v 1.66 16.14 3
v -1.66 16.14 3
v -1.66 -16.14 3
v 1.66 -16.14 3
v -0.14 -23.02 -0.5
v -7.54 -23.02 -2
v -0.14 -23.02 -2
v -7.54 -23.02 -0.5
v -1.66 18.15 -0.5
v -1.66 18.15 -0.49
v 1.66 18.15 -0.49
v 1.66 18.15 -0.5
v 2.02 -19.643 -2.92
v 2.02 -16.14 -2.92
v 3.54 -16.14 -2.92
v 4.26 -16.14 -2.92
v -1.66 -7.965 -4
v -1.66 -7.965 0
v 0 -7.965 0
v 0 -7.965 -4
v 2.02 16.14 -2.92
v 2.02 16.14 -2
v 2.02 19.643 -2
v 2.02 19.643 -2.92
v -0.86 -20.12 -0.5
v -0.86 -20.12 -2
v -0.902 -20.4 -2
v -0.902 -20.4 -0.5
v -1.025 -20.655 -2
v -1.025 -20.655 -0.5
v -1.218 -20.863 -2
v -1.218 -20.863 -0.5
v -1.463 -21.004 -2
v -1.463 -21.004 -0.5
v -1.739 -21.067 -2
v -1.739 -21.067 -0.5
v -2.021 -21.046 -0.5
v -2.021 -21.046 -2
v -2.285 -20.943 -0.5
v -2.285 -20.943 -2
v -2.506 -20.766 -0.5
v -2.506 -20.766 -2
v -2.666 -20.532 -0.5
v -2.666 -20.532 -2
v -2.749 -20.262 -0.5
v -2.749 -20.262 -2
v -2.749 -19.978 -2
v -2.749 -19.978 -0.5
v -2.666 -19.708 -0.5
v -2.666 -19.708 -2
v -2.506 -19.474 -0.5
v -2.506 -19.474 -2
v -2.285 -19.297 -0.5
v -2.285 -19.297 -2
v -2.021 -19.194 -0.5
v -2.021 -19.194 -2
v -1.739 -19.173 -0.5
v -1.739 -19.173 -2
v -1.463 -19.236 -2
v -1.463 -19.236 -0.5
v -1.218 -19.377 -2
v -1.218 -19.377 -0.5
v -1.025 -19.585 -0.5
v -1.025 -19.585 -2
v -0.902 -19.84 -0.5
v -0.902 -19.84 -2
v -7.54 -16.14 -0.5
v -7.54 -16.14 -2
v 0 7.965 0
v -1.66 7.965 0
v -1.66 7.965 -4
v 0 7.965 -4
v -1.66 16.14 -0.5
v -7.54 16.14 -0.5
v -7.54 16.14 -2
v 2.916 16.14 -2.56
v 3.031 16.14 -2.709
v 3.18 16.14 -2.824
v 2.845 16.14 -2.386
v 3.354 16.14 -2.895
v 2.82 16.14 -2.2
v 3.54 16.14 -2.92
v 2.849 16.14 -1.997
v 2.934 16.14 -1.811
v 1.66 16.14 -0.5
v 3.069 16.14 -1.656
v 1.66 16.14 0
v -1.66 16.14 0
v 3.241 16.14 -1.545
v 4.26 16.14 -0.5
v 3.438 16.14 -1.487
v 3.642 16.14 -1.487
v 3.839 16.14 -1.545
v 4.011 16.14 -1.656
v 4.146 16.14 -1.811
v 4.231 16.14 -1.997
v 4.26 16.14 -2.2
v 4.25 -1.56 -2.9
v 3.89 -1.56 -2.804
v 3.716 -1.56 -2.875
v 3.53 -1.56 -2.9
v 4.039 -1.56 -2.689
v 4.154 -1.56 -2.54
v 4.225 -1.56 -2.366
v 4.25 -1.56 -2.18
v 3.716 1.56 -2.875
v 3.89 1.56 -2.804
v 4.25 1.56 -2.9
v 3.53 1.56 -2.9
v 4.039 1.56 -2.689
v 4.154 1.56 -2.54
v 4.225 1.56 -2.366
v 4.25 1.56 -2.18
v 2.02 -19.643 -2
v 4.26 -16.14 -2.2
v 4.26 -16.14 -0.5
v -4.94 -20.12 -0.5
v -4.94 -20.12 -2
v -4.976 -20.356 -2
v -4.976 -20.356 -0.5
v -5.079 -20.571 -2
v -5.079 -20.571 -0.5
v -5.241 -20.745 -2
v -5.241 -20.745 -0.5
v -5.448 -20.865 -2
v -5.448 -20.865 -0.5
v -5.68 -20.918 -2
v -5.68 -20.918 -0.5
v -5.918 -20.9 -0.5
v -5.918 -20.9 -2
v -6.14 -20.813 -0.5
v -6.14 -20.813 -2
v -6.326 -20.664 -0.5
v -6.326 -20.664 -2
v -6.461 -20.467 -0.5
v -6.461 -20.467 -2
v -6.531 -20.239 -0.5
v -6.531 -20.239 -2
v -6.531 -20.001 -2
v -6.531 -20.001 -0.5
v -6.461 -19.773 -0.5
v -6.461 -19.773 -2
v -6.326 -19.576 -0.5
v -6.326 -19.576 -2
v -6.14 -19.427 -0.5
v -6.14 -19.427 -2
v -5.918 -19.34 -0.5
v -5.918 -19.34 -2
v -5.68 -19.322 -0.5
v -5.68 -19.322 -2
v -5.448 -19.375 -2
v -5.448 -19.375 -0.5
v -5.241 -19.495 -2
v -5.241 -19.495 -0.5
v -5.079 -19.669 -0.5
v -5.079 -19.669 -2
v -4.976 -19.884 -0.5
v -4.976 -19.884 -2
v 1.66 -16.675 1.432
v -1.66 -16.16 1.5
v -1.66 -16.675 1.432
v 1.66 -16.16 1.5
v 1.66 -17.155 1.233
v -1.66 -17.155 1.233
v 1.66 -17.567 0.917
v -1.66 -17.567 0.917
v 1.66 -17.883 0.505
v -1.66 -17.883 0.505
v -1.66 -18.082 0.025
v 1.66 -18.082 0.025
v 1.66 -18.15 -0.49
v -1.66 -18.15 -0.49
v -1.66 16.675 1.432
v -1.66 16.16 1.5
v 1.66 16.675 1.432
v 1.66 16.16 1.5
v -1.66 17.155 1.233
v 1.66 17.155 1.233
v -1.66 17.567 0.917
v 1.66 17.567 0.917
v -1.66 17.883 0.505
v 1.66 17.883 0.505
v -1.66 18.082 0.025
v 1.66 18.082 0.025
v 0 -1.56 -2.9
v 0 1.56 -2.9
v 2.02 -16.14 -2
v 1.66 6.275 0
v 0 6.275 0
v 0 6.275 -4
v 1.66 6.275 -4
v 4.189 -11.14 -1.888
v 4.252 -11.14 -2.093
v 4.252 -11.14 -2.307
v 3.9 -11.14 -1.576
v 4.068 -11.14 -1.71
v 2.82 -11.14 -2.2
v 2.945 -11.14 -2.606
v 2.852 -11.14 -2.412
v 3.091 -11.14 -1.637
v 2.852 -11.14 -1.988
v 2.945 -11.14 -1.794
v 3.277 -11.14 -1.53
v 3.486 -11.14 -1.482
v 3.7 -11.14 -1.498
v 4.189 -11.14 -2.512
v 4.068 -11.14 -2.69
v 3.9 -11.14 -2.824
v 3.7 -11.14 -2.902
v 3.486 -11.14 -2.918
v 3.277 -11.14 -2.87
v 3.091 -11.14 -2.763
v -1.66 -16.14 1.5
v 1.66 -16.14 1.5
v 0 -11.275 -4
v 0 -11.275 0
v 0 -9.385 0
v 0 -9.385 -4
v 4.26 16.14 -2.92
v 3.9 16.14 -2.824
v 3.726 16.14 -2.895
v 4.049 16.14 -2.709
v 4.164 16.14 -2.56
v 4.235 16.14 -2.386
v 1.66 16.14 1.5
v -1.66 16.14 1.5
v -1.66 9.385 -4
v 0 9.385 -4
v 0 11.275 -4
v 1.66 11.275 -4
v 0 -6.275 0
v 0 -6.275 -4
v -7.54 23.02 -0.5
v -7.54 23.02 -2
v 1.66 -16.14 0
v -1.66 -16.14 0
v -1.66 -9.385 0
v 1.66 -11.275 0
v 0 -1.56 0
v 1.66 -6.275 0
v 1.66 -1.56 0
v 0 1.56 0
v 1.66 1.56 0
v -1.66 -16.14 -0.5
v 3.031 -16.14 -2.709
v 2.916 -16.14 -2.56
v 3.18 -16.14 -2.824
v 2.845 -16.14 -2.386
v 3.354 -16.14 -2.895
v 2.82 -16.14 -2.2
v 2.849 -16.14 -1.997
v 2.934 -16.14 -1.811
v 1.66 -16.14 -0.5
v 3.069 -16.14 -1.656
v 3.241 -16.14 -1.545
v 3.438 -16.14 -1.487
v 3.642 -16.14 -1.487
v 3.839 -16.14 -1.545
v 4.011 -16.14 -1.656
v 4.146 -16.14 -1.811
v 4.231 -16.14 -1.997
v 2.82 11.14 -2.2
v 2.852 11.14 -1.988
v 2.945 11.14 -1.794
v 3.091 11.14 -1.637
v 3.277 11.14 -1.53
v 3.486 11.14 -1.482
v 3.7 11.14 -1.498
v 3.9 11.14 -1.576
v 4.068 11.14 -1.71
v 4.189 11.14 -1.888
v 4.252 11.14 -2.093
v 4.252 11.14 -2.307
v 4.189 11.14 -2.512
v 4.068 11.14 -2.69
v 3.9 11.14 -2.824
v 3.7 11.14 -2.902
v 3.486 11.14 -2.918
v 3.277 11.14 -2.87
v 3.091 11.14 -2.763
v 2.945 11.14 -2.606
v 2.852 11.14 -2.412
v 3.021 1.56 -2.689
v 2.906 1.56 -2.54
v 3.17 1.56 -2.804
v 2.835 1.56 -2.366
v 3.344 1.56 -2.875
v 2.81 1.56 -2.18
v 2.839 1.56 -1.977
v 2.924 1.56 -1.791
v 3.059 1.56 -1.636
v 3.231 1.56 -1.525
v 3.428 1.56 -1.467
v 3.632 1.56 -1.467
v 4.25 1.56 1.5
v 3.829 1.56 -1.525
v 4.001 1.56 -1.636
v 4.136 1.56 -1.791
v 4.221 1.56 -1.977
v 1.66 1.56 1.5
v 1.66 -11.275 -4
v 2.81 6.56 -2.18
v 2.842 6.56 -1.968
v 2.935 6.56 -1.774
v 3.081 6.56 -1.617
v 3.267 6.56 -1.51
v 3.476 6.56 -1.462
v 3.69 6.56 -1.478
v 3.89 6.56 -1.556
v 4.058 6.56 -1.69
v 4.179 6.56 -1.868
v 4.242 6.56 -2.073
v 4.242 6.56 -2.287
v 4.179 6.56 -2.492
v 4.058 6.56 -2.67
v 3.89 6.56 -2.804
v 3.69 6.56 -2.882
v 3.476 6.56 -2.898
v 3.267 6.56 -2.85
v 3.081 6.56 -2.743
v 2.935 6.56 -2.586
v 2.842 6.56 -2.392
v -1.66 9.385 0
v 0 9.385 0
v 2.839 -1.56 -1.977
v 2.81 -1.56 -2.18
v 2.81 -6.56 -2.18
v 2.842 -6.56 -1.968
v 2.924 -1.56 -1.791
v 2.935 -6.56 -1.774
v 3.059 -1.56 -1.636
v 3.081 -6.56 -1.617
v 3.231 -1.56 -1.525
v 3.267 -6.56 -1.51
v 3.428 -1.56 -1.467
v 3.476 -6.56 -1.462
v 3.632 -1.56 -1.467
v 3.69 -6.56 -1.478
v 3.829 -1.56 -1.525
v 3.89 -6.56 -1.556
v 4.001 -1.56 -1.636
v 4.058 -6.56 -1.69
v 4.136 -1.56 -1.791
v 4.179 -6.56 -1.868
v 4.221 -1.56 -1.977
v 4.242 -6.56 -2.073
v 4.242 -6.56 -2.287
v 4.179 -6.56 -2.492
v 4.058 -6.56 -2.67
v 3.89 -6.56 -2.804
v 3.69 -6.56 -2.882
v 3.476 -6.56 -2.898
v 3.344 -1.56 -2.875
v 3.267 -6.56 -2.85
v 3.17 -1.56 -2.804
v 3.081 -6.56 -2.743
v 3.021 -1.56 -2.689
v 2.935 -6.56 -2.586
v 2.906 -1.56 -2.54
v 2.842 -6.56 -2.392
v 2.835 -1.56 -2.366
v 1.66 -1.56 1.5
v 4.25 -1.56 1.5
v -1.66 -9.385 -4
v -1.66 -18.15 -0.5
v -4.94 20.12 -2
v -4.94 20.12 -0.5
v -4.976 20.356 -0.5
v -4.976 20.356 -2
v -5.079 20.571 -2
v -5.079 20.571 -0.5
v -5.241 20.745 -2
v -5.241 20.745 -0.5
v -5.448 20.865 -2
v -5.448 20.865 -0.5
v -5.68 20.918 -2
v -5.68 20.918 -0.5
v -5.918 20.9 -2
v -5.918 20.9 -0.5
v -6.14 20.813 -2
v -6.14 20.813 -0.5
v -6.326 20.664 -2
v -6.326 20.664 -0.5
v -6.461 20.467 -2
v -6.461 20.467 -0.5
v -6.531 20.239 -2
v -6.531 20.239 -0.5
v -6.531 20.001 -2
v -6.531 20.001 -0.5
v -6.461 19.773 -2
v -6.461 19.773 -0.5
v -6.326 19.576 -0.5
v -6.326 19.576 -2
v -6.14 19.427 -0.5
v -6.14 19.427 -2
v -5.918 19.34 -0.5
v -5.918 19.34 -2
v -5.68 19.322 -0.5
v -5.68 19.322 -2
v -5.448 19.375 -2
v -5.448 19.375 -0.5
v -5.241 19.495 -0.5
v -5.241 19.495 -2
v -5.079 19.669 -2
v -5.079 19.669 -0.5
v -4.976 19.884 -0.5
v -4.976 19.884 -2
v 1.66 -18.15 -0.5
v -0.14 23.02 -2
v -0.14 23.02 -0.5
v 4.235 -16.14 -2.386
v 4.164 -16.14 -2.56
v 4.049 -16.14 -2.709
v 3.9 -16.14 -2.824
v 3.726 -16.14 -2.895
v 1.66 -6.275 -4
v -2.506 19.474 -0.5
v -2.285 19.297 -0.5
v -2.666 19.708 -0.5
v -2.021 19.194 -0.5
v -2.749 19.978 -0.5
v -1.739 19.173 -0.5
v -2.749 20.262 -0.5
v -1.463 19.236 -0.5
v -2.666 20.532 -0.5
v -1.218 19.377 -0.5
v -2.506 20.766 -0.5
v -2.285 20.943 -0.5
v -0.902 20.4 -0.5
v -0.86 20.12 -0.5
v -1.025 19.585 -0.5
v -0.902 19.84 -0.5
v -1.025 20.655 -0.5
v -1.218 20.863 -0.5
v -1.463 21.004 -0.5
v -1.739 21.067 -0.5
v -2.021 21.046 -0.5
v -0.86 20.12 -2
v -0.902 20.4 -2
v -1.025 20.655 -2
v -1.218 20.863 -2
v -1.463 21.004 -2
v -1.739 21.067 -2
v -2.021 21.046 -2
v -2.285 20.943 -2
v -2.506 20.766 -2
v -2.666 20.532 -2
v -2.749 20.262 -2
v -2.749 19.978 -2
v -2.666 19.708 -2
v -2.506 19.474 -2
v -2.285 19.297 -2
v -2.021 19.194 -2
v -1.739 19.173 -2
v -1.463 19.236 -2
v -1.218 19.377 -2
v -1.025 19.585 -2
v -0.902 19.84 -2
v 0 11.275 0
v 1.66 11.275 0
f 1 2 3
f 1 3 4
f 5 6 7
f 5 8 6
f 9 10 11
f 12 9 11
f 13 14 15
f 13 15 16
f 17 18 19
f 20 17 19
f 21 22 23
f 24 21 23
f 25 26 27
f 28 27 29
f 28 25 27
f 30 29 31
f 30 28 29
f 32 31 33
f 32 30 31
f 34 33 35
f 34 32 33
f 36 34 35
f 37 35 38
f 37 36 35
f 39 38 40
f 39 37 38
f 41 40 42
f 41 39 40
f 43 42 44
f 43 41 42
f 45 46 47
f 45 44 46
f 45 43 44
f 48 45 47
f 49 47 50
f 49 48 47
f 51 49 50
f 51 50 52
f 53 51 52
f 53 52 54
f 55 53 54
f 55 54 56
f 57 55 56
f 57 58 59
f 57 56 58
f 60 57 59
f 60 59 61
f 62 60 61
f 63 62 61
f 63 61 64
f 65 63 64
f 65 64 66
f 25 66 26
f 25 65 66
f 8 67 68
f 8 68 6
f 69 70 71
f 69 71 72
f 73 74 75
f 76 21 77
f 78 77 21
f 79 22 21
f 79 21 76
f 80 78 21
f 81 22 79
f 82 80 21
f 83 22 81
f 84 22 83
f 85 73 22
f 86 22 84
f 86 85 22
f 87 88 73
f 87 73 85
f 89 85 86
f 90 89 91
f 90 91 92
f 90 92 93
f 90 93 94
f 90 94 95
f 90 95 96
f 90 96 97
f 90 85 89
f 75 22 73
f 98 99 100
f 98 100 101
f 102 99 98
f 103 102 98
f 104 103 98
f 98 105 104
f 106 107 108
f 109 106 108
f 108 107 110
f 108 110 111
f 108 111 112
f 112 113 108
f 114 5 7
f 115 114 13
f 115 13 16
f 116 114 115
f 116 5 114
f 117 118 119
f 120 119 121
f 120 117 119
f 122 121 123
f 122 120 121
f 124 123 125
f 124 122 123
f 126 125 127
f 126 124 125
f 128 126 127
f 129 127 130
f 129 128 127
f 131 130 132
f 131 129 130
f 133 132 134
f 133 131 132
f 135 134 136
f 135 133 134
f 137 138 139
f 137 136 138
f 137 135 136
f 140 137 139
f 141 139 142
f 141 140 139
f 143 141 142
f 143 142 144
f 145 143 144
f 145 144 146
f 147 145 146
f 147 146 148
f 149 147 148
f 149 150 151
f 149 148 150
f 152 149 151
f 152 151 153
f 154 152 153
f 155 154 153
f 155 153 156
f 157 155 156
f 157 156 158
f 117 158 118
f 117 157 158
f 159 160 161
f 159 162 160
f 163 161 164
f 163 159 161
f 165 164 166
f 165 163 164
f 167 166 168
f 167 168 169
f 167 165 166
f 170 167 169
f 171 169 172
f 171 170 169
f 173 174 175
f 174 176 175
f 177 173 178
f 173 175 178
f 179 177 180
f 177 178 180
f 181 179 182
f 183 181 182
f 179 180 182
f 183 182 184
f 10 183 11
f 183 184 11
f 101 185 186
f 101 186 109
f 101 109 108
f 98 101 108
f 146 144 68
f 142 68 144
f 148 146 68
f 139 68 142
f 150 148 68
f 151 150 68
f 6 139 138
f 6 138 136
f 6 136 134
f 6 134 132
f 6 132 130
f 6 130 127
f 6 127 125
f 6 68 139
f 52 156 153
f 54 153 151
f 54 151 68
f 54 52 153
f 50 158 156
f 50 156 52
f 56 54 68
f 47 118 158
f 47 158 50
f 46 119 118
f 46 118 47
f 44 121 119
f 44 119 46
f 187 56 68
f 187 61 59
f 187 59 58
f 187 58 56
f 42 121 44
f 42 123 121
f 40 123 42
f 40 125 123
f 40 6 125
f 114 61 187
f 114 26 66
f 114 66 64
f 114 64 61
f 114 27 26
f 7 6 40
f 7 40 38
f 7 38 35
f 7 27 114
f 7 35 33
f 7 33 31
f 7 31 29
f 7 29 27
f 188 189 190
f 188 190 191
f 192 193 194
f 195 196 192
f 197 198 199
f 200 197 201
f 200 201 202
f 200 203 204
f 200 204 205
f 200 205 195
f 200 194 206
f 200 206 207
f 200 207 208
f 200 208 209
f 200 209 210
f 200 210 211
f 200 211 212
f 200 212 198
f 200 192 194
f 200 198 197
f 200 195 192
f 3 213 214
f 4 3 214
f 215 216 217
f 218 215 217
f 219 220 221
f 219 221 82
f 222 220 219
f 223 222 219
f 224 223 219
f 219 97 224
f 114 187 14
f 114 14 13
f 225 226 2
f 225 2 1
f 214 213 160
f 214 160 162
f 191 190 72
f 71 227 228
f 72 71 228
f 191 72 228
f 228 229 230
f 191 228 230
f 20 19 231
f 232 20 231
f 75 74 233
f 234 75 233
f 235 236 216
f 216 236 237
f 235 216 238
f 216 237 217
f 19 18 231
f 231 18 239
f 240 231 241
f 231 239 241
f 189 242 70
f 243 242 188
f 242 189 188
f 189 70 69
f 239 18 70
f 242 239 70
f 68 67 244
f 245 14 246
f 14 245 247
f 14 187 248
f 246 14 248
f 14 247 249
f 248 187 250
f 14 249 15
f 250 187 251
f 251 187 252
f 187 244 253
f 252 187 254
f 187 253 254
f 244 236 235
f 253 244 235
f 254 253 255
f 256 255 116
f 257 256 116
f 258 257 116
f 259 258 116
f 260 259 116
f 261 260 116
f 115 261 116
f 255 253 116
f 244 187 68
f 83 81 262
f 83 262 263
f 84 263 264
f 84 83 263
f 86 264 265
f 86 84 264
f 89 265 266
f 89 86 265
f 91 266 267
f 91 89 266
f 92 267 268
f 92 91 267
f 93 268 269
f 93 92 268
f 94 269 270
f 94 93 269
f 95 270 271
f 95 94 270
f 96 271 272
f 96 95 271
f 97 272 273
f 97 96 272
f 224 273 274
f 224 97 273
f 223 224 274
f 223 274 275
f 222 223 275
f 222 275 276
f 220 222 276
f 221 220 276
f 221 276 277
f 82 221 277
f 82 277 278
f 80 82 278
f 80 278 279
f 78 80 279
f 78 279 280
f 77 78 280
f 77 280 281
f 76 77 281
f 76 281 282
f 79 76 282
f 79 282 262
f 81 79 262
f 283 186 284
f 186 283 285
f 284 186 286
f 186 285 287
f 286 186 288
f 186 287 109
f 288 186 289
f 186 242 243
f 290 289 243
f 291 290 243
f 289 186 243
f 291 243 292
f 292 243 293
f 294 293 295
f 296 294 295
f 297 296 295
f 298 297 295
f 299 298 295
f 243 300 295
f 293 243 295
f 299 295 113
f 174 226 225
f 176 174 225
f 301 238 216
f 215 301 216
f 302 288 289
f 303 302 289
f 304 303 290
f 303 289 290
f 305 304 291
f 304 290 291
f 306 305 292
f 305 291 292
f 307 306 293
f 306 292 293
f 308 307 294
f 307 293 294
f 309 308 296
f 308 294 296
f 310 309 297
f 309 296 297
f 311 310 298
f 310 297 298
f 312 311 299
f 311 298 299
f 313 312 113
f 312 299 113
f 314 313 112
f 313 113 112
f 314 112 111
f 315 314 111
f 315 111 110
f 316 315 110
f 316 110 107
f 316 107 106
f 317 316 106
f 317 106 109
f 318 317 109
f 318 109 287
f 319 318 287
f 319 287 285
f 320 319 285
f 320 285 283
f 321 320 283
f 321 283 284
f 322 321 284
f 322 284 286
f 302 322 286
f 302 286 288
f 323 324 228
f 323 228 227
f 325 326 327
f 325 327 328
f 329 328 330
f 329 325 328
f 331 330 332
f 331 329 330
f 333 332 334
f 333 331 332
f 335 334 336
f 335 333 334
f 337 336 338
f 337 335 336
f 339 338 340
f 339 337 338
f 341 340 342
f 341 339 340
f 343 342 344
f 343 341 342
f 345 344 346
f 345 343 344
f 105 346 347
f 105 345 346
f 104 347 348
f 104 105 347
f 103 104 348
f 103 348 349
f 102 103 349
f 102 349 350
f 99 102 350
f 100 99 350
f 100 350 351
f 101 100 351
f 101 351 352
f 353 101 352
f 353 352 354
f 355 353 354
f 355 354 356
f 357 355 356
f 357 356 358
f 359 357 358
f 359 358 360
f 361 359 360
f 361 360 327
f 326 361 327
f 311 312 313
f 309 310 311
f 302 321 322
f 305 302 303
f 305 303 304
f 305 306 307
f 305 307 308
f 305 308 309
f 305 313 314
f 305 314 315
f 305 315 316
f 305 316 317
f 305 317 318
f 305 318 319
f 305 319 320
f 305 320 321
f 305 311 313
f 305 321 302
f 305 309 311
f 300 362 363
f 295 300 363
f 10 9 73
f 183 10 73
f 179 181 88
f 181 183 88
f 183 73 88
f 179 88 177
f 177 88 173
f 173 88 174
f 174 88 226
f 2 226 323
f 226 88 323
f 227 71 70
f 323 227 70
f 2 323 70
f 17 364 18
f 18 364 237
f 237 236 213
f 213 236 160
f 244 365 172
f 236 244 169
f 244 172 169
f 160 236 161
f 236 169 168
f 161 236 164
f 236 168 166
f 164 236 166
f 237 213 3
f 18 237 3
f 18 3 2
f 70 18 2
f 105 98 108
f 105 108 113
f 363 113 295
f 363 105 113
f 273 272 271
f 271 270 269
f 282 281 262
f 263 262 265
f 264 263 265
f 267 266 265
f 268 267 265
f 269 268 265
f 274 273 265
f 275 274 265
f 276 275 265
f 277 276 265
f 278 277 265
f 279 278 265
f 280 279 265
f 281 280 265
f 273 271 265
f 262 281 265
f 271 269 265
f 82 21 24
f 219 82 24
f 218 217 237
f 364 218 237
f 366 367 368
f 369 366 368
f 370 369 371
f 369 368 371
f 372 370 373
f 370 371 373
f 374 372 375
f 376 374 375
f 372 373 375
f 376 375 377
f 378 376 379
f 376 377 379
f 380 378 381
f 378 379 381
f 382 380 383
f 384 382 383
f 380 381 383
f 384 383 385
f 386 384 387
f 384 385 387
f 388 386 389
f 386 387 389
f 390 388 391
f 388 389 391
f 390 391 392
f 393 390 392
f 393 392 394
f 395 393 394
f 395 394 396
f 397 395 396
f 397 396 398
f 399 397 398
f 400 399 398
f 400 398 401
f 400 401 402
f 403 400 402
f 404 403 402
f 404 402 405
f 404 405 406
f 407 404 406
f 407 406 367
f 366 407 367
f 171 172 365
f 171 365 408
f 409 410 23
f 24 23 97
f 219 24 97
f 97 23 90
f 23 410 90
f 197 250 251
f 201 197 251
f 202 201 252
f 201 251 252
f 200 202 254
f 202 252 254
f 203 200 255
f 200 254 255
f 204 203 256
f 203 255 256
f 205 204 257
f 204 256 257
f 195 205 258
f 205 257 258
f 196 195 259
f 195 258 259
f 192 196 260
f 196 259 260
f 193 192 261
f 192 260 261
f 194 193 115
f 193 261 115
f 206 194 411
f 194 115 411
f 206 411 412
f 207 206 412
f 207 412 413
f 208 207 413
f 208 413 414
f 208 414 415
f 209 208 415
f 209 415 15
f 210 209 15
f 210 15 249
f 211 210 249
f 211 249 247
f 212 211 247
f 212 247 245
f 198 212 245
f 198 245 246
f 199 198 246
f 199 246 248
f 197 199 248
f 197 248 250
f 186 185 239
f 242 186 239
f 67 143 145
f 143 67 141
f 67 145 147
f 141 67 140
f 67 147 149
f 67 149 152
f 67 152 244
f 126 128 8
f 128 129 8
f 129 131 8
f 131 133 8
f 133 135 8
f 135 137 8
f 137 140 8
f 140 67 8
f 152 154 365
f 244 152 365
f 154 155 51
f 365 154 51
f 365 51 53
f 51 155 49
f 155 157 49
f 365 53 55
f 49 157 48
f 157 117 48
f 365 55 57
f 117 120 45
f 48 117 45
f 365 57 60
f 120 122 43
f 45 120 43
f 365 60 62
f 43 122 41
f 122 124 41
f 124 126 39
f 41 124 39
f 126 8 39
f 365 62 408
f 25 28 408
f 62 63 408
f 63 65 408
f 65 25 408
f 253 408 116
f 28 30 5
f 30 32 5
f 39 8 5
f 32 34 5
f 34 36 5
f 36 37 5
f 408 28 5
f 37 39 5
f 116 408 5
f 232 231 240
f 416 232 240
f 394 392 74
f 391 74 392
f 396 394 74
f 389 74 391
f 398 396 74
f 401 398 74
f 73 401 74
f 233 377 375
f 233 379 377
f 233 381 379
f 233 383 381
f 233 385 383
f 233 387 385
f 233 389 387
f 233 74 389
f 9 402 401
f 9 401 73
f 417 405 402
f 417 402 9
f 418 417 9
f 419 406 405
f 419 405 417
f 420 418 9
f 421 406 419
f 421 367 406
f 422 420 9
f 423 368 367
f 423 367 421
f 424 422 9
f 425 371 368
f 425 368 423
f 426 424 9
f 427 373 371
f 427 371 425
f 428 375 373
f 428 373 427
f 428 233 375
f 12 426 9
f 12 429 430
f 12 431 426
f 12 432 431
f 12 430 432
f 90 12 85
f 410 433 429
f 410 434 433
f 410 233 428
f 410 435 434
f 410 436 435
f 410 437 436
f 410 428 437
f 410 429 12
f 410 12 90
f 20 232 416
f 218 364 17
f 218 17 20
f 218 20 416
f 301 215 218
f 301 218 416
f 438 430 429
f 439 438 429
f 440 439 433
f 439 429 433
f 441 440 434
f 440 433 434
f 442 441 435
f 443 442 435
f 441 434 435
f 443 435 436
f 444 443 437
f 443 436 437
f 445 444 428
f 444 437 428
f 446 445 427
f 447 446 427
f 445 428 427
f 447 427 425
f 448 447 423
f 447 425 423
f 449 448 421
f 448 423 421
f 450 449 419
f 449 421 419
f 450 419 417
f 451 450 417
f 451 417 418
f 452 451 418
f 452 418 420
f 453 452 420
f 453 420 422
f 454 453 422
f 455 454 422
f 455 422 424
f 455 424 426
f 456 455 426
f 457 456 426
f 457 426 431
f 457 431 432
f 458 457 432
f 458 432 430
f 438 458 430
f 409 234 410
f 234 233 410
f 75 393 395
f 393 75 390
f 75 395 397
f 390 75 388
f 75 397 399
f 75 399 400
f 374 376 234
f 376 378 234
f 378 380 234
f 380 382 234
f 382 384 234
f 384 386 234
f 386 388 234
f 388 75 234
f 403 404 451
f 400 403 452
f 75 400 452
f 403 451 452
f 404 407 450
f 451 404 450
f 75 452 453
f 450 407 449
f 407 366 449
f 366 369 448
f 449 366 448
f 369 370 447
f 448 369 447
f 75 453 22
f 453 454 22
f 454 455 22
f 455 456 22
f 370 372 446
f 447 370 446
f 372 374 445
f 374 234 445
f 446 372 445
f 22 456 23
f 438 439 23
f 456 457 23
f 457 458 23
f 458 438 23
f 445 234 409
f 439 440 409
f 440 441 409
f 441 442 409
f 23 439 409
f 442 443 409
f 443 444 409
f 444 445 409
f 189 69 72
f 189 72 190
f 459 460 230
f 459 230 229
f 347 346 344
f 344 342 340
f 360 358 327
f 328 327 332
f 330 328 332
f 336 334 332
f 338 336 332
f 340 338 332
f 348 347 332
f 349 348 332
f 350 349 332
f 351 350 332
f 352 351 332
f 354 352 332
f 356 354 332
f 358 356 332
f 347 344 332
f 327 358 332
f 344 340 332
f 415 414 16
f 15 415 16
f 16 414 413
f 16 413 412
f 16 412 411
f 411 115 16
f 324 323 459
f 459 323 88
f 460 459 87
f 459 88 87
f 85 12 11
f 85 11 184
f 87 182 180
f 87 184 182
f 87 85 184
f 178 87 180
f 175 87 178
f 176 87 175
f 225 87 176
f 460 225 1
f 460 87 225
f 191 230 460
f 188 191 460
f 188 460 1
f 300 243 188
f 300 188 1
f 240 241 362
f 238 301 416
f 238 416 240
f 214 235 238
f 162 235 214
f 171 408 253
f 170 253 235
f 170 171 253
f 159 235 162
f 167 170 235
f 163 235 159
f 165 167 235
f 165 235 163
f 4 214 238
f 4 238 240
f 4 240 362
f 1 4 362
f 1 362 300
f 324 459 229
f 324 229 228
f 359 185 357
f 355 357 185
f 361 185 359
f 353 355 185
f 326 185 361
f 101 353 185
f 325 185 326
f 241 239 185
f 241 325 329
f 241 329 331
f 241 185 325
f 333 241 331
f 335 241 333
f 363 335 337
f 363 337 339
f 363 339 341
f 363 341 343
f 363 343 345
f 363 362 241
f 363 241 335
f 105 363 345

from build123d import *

# Parameters (mm, degrees)
SKETCH_W          = 3.32
SKETCH_H          = 32.28
PAD_DEPTH         = 3
PAD001_DEPTH      = 4
SKETCH002_W       = 3.32
SKETCH002_H       = 2
PAD002_DEPTH      = 2.01
FILLET_R          = 1.99
FILLET001_R       = 1.99
SKETCH003_W       = 11.8
SKETCH003_H       = 6.88
PAD003_DEPTH      = 1.5
SKETCH006_W       = 4.25
SKETCH006_H       = 4.4
PAD005_DEPTH      = 1.56
PAD005_DEPTH_BACK = 1.56
SKETCH007_W       = 2.24
SKETCH007_H       = 6.88
PAD006_DEPTH      = 0.92
POCKET_DEPTH      = 5
SKETCH009_R       = 0.72
PAD007_DEPTH      = 5
SKETCH010_R       = 0.72
PAD008_DEPTH      = 5
SKETCH011_R       = 0.8
POCKET001_DEPTH   = 5
SKETCH012_R       = 0.95
POCKET002_DEPTH   = 5


with BuildPart() as part:
    # Sketch → Pad (new body)
    with BuildSketch(Plane.XY):
        Rectangle(SKETCH_W, SKETCH_H)
    extrude(amount=PAD_DEPTH)

    # Sketch001 (on Face5 of Pad) → Pad001 (join)
    with BuildSketch(Plane(origin=(0, 0, 0), x_dir=(1, 0, 0), z_dir=(0, 0, -1))):
        Polygon((1.66, 6.275), (1.66, 11.275), (0, 11.275), (0, 9.385), (-1.66, 9.385), (-1.66, 7.965), (0, 7.965), (0, 6.275), align=None)
    pad001 = extrude(amount=PAD001_DEPTH)

    # Mirrored: Pad001 across Sketch001 H_Axis
    add(pad001.mirror(Plane(origin=(0, 0, 0), x_dir=(0, 0, -1), z_dir=(0, -1, 0))))

    # Sketch002 (on Face6 of Mirrored) → Pad002 (join)
    with BuildSketch(Plane.XZ.offset(16.14)):
        with Locations((0, 0.5)):
            Rectangle(SKETCH002_W, SKETCH002_H)
    pad002 = extrude(amount=PAD002_DEPTH)

    # Fillet
    fillet_edges = [part.edges().sort_by_distance(p)[0] for p in [
        (0, -18.15, 1.5),
    ]]
    fillet(fillet_edges, radius=FILLET_R)

    # Mirrored001: Pad002 across XZ
    add(pad002.mirror(Plane.XZ))

    # Fillet001
    fillet001_edges = [part.edges().sort_by_distance(p)[0] for p in [
        (0, 18.15, 1.5),
    ]]
    fillet(fillet001_edges, radius=FILLET001_R)

    # Sketch003 (on Face23 of Fillet001) → Pad003 (join)
    with BuildSketch(Plane(origin=(0, 0, -0.5), x_dir=(1, 0, 0), z_dir=(0, 0, -1))):
        with Locations((-1.64, 19.58)):
            Rectangle(SKETCH003_W, SKETCH003_H)
    pad003 = extrude(amount=PAD003_DEPTH)

    # Mirrored002: Pad003 across XZ
    add(pad003.mirror(Plane.XZ))

    # Sketch006 → Pad005 (join, two sides)
    with BuildSketch(Plane.XZ) as pad005_sk:
        with Locations((2.125, -0.7)):
            Rectangle(SKETCH006_W, SKETCH006_H)
    extrude(amount=PAD005_DEPTH)
    extrude(pad005_sk.sketch, amount=-PAD005_DEPTH_BACK)

    # Sketch007 (on Face56 of Pad005) → Pad006 (join)
    with BuildSketch(Plane(origin=(0, 0, -2), x_dir=(1, 0, 0), z_dir=(0, 0, -1))):
        with Locations((3.14, 19.58)):
            Rectangle(SKETCH007_W, SKETCH007_H)
    pad006 = extrude(amount=PAD006_DEPTH)

    # Mirrored003: Pad006 across XZ
    add(pad006.mirror(Plane.XZ))

    # Sketch008 (on Face43 of Mirrored003) → Pocket (cut)
    with BuildSketch(Plane.XY.offset(-0.5)):
        Polygon((4.26, -16.14), (4.26, -23.02), (-0.14, -23.02), align=None)
    pocket = extrude(amount=-POCKET_DEPTH, mode=Mode.SUBTRACT)

    # Mirrored004: Pocket across XZ
    add(pocket.mirror(Plane.XZ), mode=Mode.SUBTRACT)

    # Sketch009 (on Face59 of Mirrored004) → Pad007 (join)
    with BuildSketch(Plane(origin=(0, -16.14, 0), x_dir=(-1, 0, 0), z_dir=(0, 1, 0))):
        with Locations((-3.54, -2.2)):
            Circle(SKETCH009_R)
    pad007 = extrude(amount=PAD007_DEPTH)

    # Mirrored005: Pad007 across XZ
    add(pad007.mirror(Plane.XZ))

    # Sketch010 (on Face35 of Mirrored005) → Pad008 (join)
    with BuildSketch(Plane(origin=(0, 1.56, 0), x_dir=(-1, 0, 0), z_dir=(0, 1, 0))):
        with Locations((-3.53, -2.18)):
            Circle(SKETCH010_R)
    pad008 = extrude(amount=PAD008_DEPTH)

    # Mirrored006: Pad008 across XZ
    add(pad008.mirror(Plane.XZ))

    # Sketch011 (on Face2 of Mirrored006) → Pocket001 (cut)
    with BuildSketch(Plane.XY.offset(-0.5)):
        with Locations((-5.74, 20.12)):
            Circle(SKETCH011_R)
    pocket001 = extrude(amount=-POCKET001_DEPTH, mode=Mode.SUBTRACT)

    # Mirrored007: Pocket001 across XZ
    add(pocket001.mirror(Plane.XZ), mode=Mode.SUBTRACT)

    # Sketch012 (on Face2 of Mirrored007) → Pocket002 (cut)
    with BuildSketch(Plane.XY.offset(-0.5)):
        with Locations((-1.81, 20.12)):
            Circle(SKETCH012_R)
    pocket002 = extrude(amount=-POCKET002_DEPTH, mode=Mode.SUBTRACT)

    # Mirrored008: Pocket002 across XZ
    add(pocket002.mirror(Plane.XZ), mode=Mode.SUBTRACT)


solid = part.part
